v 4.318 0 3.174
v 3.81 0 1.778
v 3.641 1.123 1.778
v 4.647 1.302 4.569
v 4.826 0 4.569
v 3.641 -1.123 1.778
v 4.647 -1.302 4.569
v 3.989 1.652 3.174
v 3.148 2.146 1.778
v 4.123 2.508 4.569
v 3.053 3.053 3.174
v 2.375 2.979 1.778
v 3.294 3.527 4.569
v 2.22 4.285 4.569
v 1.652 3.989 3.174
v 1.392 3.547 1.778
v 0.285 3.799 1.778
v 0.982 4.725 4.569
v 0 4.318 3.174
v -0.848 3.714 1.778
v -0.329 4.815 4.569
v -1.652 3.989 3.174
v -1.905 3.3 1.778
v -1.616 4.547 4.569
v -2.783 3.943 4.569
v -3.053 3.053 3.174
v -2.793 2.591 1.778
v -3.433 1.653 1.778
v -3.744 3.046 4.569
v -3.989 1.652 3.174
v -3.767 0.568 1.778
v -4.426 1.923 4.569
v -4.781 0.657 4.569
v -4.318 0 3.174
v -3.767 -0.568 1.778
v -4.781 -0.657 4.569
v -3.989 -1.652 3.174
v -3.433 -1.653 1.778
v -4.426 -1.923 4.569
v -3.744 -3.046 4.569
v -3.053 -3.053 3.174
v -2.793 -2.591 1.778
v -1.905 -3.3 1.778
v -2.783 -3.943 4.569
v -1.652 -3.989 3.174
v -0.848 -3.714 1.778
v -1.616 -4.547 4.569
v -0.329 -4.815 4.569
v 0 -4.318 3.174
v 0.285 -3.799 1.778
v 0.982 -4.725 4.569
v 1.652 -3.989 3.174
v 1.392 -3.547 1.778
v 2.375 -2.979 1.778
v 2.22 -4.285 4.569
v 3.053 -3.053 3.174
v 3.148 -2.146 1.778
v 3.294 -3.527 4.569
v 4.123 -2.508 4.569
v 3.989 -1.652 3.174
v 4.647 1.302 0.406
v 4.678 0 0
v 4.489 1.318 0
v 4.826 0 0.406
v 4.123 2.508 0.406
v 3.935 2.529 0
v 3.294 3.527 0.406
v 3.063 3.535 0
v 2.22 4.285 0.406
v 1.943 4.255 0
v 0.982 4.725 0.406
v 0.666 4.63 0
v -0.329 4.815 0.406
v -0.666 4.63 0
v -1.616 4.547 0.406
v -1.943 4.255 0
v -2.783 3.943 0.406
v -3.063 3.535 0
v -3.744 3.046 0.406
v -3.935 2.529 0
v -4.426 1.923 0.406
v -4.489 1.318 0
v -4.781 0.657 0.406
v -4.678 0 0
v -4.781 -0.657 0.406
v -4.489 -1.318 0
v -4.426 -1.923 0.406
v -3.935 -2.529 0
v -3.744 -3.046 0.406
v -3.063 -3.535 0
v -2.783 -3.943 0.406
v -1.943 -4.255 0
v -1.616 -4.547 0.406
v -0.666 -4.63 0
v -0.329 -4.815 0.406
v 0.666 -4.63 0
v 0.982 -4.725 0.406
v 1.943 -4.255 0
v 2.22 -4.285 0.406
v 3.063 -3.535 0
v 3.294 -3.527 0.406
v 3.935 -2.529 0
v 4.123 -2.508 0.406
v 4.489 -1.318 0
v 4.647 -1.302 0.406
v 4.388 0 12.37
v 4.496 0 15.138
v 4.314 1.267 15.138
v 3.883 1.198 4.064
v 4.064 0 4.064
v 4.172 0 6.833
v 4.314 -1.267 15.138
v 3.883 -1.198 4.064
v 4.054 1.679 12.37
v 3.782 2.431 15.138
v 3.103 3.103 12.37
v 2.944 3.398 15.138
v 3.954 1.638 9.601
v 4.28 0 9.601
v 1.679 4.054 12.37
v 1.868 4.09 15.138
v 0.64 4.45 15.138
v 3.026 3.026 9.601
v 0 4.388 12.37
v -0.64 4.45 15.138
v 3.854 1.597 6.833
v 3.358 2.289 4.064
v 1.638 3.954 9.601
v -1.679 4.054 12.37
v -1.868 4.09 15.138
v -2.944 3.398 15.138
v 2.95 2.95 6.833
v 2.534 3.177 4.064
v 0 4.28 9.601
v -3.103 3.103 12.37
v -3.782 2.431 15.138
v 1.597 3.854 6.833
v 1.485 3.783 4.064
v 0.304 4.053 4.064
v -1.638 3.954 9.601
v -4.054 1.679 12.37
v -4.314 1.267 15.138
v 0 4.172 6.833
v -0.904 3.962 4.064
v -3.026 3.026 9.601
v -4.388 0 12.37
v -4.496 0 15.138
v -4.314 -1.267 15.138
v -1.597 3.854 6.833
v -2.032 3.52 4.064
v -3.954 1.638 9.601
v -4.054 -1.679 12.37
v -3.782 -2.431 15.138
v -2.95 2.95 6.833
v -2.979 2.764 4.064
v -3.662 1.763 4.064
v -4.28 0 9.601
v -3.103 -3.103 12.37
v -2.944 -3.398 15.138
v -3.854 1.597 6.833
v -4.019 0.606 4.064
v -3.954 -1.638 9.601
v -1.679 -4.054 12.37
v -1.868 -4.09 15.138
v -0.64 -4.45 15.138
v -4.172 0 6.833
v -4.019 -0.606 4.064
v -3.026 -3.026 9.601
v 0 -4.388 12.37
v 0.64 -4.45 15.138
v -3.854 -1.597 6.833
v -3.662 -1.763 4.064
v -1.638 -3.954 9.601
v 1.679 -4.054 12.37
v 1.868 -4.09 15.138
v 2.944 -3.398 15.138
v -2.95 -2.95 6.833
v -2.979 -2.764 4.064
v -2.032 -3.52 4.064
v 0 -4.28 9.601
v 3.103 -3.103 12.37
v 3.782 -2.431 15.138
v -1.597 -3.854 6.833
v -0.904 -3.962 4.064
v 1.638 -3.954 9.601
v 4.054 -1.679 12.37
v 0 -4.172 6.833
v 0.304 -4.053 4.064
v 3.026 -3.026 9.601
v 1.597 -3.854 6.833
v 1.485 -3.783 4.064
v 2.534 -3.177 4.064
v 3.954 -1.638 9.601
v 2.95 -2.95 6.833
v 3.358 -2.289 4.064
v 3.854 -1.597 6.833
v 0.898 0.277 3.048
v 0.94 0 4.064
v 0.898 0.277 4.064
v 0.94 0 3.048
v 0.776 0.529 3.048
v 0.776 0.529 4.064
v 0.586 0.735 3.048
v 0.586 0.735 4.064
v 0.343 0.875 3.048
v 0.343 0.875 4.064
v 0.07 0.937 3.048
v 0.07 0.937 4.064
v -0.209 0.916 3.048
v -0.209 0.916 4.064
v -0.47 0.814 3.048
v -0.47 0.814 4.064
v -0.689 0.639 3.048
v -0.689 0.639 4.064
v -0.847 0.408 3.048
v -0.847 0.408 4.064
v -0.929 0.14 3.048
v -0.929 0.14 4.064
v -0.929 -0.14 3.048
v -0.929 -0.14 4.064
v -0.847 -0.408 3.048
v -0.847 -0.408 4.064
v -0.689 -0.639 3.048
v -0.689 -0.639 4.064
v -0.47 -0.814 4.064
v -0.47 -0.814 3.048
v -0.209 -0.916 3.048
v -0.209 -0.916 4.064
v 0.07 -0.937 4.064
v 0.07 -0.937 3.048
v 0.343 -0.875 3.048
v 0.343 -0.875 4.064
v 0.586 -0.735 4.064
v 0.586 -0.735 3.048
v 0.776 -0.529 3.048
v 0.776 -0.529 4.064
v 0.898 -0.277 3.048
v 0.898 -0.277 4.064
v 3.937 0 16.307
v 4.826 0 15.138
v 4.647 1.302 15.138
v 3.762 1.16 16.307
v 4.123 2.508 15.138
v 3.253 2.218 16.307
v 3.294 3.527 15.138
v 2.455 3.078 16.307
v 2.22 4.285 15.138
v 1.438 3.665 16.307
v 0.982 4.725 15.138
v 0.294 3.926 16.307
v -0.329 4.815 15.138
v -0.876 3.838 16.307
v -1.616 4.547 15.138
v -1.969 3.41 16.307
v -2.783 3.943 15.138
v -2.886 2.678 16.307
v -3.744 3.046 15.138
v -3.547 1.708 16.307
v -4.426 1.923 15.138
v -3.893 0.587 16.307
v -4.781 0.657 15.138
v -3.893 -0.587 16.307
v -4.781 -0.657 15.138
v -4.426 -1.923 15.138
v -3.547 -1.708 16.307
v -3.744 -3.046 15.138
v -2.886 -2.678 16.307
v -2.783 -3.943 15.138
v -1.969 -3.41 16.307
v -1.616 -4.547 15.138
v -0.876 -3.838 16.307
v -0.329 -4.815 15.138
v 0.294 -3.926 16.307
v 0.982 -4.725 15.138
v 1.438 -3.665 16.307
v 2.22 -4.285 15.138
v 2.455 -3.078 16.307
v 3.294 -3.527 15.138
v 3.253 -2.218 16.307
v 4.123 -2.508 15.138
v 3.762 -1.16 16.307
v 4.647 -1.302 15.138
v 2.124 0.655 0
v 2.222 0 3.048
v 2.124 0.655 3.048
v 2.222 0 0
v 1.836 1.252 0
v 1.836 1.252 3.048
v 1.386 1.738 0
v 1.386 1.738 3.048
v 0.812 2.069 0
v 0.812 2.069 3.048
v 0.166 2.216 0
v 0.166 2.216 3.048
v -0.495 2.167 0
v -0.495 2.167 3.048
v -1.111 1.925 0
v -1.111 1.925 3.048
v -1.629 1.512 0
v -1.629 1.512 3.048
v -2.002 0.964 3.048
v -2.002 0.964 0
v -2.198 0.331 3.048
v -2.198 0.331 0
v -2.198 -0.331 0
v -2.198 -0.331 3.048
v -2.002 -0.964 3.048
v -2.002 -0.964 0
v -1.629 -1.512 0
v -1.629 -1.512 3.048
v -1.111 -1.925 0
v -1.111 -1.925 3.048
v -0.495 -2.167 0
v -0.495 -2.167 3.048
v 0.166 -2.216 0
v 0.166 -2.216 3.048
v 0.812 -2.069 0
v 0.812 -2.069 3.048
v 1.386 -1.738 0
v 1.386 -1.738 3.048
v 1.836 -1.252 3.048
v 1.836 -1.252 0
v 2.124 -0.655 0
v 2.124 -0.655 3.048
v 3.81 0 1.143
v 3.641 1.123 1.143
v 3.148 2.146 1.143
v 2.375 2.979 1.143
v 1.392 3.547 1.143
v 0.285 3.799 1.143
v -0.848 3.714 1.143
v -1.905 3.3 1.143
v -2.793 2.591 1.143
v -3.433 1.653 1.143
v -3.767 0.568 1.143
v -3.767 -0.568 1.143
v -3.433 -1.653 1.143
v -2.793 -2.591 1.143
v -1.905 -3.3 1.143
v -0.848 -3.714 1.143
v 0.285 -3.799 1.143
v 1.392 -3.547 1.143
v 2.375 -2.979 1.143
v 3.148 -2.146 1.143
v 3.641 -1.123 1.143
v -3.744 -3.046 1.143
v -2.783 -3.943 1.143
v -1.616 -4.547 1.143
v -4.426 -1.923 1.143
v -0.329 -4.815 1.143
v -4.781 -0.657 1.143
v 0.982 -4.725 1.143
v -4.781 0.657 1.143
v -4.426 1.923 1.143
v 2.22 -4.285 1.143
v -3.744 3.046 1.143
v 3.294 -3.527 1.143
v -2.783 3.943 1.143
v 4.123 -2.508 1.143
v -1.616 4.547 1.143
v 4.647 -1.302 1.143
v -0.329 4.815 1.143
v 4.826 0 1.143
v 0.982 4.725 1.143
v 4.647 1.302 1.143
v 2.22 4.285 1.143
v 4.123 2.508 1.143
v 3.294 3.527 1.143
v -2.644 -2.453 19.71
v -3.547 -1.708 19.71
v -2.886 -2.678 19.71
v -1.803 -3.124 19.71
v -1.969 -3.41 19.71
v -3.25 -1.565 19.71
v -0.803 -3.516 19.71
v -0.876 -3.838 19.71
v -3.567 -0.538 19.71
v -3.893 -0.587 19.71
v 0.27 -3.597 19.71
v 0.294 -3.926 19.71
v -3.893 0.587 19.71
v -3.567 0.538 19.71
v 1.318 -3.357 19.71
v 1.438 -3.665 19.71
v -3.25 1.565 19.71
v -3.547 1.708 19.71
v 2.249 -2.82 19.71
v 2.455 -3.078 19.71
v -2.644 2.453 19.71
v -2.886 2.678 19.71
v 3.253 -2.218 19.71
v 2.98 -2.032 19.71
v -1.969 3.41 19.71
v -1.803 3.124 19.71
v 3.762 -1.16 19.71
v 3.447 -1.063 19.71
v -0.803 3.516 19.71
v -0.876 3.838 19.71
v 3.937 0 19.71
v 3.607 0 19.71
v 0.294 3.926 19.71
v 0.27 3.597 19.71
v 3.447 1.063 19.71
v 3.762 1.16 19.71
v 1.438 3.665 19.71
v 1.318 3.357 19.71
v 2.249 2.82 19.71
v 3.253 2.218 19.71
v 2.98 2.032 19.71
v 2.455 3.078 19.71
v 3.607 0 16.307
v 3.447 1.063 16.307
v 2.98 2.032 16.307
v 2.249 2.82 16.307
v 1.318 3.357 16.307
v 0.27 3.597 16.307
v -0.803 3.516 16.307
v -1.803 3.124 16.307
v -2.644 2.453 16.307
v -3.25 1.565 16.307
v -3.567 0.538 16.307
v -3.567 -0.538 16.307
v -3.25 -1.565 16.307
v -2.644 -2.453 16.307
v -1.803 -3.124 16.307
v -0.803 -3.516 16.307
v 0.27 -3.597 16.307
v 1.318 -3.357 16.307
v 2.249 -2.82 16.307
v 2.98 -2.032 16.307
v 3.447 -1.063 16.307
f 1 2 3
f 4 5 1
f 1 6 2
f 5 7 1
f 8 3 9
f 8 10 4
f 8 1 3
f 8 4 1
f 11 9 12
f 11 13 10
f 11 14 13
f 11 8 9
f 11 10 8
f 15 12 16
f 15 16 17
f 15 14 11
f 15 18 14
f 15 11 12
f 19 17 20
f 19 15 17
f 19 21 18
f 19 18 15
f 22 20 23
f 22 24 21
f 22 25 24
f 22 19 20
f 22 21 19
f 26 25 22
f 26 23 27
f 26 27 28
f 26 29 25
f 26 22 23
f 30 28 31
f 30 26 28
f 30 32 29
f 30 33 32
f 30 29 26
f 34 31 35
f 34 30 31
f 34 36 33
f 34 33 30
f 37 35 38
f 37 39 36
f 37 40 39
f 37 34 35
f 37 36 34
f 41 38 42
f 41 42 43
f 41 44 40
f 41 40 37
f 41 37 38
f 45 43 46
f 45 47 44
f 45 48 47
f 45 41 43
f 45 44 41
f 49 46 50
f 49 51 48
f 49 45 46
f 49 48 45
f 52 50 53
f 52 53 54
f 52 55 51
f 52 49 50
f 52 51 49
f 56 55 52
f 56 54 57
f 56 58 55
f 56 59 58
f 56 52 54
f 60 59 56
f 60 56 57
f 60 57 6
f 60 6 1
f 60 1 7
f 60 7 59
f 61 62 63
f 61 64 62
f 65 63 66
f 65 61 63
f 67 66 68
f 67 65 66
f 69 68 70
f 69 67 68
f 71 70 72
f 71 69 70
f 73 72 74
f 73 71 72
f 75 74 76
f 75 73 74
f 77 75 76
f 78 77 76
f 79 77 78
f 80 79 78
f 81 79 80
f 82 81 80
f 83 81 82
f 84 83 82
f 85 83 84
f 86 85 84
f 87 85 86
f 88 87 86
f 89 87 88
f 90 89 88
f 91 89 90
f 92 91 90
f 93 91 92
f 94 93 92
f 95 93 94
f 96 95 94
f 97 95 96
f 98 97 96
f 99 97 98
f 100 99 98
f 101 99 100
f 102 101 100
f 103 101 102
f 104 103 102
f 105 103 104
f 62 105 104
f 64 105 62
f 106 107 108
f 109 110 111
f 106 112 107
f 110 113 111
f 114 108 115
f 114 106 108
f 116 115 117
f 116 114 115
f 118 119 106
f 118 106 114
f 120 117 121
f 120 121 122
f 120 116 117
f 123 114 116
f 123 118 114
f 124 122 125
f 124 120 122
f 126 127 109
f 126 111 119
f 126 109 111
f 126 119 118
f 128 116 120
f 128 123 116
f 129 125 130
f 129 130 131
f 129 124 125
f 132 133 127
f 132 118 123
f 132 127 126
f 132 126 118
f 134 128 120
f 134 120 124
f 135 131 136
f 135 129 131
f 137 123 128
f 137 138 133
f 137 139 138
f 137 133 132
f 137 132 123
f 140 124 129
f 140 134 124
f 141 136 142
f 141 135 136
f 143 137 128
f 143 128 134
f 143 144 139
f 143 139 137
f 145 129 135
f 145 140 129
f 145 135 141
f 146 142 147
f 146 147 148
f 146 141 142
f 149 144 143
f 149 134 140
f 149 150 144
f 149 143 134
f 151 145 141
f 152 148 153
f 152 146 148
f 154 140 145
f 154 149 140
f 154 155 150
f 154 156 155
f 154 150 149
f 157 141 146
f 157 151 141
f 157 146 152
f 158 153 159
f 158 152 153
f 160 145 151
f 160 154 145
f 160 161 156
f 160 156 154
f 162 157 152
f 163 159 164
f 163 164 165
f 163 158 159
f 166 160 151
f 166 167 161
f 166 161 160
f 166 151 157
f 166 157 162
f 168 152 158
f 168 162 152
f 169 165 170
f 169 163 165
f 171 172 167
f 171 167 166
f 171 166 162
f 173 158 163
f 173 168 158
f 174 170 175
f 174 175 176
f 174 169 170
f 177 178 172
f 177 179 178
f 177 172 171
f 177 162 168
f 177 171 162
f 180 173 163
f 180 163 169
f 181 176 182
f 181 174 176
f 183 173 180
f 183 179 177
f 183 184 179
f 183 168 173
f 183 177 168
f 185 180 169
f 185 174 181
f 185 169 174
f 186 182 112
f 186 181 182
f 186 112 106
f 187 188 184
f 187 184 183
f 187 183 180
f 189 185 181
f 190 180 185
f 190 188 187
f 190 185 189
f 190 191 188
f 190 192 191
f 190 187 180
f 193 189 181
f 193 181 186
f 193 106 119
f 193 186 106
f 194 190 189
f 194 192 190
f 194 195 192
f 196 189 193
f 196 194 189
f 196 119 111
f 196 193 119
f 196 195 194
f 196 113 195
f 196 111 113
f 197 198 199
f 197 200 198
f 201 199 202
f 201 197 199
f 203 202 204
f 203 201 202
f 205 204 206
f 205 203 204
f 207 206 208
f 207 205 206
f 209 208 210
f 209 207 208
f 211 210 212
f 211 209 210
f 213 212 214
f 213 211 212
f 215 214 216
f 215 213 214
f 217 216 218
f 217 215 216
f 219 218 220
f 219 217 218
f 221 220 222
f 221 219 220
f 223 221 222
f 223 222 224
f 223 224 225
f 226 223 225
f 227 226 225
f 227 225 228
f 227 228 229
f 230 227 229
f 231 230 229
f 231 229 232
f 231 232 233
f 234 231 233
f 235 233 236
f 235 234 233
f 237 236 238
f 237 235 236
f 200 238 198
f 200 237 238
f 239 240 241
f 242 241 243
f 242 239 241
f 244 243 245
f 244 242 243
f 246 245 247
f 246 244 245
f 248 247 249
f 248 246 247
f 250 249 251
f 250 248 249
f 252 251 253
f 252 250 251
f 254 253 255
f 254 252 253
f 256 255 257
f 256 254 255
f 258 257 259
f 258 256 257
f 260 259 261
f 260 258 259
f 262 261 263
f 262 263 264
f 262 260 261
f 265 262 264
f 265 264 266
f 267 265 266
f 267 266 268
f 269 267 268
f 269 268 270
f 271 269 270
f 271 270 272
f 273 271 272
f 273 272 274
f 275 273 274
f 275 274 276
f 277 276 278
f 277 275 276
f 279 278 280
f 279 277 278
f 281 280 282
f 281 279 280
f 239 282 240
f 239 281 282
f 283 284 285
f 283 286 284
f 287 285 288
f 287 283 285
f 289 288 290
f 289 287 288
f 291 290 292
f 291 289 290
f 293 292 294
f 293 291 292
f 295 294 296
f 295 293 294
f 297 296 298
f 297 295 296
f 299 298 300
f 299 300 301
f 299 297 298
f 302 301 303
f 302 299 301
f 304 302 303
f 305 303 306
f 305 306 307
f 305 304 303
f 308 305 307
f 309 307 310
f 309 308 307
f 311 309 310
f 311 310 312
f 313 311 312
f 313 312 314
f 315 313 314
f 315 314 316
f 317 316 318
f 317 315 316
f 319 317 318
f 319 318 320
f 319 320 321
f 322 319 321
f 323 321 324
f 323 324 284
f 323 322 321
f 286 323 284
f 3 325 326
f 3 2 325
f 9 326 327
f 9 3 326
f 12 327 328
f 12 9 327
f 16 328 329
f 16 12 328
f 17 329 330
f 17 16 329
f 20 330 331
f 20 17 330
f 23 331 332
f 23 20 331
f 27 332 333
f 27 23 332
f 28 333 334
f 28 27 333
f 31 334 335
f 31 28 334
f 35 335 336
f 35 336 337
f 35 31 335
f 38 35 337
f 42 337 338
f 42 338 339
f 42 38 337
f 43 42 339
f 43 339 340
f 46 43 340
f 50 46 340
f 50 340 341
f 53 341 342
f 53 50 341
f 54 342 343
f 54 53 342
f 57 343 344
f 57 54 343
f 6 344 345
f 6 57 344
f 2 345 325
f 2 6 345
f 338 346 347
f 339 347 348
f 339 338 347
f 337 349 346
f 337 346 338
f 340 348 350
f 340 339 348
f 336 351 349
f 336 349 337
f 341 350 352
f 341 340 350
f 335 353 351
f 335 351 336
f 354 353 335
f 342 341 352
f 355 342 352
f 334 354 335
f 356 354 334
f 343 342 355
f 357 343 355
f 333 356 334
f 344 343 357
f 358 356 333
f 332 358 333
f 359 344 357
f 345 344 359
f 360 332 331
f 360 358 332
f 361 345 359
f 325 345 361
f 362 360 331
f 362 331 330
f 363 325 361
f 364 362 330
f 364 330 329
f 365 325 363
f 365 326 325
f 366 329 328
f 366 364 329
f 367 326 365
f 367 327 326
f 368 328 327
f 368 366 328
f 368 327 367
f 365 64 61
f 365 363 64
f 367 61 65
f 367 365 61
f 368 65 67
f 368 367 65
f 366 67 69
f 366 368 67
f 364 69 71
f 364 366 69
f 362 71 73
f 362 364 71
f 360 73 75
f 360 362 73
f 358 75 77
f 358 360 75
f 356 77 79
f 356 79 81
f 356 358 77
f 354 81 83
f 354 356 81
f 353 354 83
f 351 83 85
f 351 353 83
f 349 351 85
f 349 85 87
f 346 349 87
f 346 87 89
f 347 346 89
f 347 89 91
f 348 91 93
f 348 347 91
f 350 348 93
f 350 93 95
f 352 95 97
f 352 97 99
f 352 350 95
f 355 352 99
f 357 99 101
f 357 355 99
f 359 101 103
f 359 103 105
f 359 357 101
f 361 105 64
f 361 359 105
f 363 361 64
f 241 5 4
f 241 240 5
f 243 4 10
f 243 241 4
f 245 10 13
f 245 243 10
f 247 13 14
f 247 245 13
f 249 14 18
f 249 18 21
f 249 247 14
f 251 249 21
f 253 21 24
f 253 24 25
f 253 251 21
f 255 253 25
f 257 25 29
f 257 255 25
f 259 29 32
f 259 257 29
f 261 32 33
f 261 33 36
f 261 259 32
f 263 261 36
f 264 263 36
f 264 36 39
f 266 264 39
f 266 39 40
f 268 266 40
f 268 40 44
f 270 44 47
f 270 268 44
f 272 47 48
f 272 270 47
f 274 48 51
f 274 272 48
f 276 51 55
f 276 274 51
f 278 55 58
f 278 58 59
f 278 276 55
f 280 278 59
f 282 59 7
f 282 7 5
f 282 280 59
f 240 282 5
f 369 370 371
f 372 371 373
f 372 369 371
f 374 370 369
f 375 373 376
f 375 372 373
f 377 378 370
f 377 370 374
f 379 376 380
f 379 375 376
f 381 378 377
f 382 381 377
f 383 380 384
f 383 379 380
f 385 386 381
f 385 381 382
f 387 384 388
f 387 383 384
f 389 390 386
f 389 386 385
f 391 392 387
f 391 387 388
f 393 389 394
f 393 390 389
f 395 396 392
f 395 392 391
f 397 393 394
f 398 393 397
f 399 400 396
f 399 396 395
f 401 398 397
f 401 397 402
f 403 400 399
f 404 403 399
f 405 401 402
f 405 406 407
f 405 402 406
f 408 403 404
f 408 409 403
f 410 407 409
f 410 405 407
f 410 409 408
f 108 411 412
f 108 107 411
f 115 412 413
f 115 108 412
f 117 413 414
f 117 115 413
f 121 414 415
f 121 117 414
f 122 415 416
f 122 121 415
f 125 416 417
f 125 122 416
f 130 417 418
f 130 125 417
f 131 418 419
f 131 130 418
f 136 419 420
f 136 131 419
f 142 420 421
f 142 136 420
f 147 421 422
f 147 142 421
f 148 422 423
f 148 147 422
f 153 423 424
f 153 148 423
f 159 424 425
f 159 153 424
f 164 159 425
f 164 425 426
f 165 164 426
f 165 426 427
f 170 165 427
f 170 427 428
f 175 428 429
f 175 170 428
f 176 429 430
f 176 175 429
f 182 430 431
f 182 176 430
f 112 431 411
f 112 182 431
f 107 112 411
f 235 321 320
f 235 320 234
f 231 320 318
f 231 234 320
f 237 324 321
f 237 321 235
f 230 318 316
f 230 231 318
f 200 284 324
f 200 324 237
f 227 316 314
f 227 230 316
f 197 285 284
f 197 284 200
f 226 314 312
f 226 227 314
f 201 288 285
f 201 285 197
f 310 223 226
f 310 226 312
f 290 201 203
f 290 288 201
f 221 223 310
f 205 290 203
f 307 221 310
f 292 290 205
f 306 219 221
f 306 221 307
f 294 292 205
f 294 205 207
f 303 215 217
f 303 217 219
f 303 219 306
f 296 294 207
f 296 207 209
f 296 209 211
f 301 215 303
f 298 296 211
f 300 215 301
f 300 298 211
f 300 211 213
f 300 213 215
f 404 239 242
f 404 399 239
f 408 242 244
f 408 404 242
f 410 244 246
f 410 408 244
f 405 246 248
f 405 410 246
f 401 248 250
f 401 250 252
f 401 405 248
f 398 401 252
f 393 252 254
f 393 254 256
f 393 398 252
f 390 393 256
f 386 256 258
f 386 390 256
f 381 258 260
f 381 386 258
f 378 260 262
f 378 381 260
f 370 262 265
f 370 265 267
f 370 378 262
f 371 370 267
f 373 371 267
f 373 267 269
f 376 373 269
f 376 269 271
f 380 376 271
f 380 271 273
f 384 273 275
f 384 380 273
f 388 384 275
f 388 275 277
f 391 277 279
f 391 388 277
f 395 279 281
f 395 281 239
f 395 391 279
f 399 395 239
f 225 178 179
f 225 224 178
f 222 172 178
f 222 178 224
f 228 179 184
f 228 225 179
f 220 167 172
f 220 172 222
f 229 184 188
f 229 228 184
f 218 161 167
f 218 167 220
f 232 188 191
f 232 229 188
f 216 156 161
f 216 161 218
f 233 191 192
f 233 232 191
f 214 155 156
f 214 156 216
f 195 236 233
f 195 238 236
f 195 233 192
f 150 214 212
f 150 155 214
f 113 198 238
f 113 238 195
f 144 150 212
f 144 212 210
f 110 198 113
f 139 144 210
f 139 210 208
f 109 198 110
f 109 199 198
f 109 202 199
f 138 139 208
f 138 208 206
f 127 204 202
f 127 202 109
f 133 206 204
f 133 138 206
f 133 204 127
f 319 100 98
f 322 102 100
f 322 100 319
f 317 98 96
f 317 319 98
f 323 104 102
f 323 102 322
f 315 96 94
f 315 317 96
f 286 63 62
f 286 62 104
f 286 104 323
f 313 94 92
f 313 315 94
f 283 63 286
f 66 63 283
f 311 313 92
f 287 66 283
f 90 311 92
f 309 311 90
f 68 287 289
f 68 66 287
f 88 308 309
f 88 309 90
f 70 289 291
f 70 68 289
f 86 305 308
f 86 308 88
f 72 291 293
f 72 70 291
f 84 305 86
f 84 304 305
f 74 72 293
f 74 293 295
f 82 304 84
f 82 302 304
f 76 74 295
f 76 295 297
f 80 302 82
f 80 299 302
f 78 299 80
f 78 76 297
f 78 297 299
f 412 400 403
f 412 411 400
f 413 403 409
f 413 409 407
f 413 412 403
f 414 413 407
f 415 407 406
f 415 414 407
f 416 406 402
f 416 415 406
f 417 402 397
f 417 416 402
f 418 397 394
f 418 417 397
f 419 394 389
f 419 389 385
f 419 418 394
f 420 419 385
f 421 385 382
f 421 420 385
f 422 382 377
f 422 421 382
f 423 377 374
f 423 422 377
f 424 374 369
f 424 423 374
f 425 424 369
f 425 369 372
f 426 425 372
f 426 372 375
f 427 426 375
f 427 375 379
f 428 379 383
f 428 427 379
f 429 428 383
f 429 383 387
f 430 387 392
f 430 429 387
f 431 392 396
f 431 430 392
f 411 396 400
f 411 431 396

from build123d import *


with BuildPart() as f1:
    # F0 (on Front) → F1 (revolve)
    with BuildSketch(Plane.XZ):
        Polygon((2.2225, 3.048), (2.2225, 0), (4.678082, 0), (4.826, 0.4064), (4.826, 1.143), (3.81, 1.143), (3.81, 1.778), (4.826, 4.569437), (4.826, 15.1384), (3.937, 16.3068), (3.937, 19.7104), (3.6068, 19.7104), (3.6068, 16.3068), (4.4958, 15.1384), (4.064, 4.064), (0.9398, 4.064), (0.9398, 3.048), align=None)
    revolve(axis=Axis((0, 0, 11.499301), (0, 0, 1)))


with BuildPart() as f2_1:
    # F2: copy of F1
    add(f1.part)


solid = f1.part
